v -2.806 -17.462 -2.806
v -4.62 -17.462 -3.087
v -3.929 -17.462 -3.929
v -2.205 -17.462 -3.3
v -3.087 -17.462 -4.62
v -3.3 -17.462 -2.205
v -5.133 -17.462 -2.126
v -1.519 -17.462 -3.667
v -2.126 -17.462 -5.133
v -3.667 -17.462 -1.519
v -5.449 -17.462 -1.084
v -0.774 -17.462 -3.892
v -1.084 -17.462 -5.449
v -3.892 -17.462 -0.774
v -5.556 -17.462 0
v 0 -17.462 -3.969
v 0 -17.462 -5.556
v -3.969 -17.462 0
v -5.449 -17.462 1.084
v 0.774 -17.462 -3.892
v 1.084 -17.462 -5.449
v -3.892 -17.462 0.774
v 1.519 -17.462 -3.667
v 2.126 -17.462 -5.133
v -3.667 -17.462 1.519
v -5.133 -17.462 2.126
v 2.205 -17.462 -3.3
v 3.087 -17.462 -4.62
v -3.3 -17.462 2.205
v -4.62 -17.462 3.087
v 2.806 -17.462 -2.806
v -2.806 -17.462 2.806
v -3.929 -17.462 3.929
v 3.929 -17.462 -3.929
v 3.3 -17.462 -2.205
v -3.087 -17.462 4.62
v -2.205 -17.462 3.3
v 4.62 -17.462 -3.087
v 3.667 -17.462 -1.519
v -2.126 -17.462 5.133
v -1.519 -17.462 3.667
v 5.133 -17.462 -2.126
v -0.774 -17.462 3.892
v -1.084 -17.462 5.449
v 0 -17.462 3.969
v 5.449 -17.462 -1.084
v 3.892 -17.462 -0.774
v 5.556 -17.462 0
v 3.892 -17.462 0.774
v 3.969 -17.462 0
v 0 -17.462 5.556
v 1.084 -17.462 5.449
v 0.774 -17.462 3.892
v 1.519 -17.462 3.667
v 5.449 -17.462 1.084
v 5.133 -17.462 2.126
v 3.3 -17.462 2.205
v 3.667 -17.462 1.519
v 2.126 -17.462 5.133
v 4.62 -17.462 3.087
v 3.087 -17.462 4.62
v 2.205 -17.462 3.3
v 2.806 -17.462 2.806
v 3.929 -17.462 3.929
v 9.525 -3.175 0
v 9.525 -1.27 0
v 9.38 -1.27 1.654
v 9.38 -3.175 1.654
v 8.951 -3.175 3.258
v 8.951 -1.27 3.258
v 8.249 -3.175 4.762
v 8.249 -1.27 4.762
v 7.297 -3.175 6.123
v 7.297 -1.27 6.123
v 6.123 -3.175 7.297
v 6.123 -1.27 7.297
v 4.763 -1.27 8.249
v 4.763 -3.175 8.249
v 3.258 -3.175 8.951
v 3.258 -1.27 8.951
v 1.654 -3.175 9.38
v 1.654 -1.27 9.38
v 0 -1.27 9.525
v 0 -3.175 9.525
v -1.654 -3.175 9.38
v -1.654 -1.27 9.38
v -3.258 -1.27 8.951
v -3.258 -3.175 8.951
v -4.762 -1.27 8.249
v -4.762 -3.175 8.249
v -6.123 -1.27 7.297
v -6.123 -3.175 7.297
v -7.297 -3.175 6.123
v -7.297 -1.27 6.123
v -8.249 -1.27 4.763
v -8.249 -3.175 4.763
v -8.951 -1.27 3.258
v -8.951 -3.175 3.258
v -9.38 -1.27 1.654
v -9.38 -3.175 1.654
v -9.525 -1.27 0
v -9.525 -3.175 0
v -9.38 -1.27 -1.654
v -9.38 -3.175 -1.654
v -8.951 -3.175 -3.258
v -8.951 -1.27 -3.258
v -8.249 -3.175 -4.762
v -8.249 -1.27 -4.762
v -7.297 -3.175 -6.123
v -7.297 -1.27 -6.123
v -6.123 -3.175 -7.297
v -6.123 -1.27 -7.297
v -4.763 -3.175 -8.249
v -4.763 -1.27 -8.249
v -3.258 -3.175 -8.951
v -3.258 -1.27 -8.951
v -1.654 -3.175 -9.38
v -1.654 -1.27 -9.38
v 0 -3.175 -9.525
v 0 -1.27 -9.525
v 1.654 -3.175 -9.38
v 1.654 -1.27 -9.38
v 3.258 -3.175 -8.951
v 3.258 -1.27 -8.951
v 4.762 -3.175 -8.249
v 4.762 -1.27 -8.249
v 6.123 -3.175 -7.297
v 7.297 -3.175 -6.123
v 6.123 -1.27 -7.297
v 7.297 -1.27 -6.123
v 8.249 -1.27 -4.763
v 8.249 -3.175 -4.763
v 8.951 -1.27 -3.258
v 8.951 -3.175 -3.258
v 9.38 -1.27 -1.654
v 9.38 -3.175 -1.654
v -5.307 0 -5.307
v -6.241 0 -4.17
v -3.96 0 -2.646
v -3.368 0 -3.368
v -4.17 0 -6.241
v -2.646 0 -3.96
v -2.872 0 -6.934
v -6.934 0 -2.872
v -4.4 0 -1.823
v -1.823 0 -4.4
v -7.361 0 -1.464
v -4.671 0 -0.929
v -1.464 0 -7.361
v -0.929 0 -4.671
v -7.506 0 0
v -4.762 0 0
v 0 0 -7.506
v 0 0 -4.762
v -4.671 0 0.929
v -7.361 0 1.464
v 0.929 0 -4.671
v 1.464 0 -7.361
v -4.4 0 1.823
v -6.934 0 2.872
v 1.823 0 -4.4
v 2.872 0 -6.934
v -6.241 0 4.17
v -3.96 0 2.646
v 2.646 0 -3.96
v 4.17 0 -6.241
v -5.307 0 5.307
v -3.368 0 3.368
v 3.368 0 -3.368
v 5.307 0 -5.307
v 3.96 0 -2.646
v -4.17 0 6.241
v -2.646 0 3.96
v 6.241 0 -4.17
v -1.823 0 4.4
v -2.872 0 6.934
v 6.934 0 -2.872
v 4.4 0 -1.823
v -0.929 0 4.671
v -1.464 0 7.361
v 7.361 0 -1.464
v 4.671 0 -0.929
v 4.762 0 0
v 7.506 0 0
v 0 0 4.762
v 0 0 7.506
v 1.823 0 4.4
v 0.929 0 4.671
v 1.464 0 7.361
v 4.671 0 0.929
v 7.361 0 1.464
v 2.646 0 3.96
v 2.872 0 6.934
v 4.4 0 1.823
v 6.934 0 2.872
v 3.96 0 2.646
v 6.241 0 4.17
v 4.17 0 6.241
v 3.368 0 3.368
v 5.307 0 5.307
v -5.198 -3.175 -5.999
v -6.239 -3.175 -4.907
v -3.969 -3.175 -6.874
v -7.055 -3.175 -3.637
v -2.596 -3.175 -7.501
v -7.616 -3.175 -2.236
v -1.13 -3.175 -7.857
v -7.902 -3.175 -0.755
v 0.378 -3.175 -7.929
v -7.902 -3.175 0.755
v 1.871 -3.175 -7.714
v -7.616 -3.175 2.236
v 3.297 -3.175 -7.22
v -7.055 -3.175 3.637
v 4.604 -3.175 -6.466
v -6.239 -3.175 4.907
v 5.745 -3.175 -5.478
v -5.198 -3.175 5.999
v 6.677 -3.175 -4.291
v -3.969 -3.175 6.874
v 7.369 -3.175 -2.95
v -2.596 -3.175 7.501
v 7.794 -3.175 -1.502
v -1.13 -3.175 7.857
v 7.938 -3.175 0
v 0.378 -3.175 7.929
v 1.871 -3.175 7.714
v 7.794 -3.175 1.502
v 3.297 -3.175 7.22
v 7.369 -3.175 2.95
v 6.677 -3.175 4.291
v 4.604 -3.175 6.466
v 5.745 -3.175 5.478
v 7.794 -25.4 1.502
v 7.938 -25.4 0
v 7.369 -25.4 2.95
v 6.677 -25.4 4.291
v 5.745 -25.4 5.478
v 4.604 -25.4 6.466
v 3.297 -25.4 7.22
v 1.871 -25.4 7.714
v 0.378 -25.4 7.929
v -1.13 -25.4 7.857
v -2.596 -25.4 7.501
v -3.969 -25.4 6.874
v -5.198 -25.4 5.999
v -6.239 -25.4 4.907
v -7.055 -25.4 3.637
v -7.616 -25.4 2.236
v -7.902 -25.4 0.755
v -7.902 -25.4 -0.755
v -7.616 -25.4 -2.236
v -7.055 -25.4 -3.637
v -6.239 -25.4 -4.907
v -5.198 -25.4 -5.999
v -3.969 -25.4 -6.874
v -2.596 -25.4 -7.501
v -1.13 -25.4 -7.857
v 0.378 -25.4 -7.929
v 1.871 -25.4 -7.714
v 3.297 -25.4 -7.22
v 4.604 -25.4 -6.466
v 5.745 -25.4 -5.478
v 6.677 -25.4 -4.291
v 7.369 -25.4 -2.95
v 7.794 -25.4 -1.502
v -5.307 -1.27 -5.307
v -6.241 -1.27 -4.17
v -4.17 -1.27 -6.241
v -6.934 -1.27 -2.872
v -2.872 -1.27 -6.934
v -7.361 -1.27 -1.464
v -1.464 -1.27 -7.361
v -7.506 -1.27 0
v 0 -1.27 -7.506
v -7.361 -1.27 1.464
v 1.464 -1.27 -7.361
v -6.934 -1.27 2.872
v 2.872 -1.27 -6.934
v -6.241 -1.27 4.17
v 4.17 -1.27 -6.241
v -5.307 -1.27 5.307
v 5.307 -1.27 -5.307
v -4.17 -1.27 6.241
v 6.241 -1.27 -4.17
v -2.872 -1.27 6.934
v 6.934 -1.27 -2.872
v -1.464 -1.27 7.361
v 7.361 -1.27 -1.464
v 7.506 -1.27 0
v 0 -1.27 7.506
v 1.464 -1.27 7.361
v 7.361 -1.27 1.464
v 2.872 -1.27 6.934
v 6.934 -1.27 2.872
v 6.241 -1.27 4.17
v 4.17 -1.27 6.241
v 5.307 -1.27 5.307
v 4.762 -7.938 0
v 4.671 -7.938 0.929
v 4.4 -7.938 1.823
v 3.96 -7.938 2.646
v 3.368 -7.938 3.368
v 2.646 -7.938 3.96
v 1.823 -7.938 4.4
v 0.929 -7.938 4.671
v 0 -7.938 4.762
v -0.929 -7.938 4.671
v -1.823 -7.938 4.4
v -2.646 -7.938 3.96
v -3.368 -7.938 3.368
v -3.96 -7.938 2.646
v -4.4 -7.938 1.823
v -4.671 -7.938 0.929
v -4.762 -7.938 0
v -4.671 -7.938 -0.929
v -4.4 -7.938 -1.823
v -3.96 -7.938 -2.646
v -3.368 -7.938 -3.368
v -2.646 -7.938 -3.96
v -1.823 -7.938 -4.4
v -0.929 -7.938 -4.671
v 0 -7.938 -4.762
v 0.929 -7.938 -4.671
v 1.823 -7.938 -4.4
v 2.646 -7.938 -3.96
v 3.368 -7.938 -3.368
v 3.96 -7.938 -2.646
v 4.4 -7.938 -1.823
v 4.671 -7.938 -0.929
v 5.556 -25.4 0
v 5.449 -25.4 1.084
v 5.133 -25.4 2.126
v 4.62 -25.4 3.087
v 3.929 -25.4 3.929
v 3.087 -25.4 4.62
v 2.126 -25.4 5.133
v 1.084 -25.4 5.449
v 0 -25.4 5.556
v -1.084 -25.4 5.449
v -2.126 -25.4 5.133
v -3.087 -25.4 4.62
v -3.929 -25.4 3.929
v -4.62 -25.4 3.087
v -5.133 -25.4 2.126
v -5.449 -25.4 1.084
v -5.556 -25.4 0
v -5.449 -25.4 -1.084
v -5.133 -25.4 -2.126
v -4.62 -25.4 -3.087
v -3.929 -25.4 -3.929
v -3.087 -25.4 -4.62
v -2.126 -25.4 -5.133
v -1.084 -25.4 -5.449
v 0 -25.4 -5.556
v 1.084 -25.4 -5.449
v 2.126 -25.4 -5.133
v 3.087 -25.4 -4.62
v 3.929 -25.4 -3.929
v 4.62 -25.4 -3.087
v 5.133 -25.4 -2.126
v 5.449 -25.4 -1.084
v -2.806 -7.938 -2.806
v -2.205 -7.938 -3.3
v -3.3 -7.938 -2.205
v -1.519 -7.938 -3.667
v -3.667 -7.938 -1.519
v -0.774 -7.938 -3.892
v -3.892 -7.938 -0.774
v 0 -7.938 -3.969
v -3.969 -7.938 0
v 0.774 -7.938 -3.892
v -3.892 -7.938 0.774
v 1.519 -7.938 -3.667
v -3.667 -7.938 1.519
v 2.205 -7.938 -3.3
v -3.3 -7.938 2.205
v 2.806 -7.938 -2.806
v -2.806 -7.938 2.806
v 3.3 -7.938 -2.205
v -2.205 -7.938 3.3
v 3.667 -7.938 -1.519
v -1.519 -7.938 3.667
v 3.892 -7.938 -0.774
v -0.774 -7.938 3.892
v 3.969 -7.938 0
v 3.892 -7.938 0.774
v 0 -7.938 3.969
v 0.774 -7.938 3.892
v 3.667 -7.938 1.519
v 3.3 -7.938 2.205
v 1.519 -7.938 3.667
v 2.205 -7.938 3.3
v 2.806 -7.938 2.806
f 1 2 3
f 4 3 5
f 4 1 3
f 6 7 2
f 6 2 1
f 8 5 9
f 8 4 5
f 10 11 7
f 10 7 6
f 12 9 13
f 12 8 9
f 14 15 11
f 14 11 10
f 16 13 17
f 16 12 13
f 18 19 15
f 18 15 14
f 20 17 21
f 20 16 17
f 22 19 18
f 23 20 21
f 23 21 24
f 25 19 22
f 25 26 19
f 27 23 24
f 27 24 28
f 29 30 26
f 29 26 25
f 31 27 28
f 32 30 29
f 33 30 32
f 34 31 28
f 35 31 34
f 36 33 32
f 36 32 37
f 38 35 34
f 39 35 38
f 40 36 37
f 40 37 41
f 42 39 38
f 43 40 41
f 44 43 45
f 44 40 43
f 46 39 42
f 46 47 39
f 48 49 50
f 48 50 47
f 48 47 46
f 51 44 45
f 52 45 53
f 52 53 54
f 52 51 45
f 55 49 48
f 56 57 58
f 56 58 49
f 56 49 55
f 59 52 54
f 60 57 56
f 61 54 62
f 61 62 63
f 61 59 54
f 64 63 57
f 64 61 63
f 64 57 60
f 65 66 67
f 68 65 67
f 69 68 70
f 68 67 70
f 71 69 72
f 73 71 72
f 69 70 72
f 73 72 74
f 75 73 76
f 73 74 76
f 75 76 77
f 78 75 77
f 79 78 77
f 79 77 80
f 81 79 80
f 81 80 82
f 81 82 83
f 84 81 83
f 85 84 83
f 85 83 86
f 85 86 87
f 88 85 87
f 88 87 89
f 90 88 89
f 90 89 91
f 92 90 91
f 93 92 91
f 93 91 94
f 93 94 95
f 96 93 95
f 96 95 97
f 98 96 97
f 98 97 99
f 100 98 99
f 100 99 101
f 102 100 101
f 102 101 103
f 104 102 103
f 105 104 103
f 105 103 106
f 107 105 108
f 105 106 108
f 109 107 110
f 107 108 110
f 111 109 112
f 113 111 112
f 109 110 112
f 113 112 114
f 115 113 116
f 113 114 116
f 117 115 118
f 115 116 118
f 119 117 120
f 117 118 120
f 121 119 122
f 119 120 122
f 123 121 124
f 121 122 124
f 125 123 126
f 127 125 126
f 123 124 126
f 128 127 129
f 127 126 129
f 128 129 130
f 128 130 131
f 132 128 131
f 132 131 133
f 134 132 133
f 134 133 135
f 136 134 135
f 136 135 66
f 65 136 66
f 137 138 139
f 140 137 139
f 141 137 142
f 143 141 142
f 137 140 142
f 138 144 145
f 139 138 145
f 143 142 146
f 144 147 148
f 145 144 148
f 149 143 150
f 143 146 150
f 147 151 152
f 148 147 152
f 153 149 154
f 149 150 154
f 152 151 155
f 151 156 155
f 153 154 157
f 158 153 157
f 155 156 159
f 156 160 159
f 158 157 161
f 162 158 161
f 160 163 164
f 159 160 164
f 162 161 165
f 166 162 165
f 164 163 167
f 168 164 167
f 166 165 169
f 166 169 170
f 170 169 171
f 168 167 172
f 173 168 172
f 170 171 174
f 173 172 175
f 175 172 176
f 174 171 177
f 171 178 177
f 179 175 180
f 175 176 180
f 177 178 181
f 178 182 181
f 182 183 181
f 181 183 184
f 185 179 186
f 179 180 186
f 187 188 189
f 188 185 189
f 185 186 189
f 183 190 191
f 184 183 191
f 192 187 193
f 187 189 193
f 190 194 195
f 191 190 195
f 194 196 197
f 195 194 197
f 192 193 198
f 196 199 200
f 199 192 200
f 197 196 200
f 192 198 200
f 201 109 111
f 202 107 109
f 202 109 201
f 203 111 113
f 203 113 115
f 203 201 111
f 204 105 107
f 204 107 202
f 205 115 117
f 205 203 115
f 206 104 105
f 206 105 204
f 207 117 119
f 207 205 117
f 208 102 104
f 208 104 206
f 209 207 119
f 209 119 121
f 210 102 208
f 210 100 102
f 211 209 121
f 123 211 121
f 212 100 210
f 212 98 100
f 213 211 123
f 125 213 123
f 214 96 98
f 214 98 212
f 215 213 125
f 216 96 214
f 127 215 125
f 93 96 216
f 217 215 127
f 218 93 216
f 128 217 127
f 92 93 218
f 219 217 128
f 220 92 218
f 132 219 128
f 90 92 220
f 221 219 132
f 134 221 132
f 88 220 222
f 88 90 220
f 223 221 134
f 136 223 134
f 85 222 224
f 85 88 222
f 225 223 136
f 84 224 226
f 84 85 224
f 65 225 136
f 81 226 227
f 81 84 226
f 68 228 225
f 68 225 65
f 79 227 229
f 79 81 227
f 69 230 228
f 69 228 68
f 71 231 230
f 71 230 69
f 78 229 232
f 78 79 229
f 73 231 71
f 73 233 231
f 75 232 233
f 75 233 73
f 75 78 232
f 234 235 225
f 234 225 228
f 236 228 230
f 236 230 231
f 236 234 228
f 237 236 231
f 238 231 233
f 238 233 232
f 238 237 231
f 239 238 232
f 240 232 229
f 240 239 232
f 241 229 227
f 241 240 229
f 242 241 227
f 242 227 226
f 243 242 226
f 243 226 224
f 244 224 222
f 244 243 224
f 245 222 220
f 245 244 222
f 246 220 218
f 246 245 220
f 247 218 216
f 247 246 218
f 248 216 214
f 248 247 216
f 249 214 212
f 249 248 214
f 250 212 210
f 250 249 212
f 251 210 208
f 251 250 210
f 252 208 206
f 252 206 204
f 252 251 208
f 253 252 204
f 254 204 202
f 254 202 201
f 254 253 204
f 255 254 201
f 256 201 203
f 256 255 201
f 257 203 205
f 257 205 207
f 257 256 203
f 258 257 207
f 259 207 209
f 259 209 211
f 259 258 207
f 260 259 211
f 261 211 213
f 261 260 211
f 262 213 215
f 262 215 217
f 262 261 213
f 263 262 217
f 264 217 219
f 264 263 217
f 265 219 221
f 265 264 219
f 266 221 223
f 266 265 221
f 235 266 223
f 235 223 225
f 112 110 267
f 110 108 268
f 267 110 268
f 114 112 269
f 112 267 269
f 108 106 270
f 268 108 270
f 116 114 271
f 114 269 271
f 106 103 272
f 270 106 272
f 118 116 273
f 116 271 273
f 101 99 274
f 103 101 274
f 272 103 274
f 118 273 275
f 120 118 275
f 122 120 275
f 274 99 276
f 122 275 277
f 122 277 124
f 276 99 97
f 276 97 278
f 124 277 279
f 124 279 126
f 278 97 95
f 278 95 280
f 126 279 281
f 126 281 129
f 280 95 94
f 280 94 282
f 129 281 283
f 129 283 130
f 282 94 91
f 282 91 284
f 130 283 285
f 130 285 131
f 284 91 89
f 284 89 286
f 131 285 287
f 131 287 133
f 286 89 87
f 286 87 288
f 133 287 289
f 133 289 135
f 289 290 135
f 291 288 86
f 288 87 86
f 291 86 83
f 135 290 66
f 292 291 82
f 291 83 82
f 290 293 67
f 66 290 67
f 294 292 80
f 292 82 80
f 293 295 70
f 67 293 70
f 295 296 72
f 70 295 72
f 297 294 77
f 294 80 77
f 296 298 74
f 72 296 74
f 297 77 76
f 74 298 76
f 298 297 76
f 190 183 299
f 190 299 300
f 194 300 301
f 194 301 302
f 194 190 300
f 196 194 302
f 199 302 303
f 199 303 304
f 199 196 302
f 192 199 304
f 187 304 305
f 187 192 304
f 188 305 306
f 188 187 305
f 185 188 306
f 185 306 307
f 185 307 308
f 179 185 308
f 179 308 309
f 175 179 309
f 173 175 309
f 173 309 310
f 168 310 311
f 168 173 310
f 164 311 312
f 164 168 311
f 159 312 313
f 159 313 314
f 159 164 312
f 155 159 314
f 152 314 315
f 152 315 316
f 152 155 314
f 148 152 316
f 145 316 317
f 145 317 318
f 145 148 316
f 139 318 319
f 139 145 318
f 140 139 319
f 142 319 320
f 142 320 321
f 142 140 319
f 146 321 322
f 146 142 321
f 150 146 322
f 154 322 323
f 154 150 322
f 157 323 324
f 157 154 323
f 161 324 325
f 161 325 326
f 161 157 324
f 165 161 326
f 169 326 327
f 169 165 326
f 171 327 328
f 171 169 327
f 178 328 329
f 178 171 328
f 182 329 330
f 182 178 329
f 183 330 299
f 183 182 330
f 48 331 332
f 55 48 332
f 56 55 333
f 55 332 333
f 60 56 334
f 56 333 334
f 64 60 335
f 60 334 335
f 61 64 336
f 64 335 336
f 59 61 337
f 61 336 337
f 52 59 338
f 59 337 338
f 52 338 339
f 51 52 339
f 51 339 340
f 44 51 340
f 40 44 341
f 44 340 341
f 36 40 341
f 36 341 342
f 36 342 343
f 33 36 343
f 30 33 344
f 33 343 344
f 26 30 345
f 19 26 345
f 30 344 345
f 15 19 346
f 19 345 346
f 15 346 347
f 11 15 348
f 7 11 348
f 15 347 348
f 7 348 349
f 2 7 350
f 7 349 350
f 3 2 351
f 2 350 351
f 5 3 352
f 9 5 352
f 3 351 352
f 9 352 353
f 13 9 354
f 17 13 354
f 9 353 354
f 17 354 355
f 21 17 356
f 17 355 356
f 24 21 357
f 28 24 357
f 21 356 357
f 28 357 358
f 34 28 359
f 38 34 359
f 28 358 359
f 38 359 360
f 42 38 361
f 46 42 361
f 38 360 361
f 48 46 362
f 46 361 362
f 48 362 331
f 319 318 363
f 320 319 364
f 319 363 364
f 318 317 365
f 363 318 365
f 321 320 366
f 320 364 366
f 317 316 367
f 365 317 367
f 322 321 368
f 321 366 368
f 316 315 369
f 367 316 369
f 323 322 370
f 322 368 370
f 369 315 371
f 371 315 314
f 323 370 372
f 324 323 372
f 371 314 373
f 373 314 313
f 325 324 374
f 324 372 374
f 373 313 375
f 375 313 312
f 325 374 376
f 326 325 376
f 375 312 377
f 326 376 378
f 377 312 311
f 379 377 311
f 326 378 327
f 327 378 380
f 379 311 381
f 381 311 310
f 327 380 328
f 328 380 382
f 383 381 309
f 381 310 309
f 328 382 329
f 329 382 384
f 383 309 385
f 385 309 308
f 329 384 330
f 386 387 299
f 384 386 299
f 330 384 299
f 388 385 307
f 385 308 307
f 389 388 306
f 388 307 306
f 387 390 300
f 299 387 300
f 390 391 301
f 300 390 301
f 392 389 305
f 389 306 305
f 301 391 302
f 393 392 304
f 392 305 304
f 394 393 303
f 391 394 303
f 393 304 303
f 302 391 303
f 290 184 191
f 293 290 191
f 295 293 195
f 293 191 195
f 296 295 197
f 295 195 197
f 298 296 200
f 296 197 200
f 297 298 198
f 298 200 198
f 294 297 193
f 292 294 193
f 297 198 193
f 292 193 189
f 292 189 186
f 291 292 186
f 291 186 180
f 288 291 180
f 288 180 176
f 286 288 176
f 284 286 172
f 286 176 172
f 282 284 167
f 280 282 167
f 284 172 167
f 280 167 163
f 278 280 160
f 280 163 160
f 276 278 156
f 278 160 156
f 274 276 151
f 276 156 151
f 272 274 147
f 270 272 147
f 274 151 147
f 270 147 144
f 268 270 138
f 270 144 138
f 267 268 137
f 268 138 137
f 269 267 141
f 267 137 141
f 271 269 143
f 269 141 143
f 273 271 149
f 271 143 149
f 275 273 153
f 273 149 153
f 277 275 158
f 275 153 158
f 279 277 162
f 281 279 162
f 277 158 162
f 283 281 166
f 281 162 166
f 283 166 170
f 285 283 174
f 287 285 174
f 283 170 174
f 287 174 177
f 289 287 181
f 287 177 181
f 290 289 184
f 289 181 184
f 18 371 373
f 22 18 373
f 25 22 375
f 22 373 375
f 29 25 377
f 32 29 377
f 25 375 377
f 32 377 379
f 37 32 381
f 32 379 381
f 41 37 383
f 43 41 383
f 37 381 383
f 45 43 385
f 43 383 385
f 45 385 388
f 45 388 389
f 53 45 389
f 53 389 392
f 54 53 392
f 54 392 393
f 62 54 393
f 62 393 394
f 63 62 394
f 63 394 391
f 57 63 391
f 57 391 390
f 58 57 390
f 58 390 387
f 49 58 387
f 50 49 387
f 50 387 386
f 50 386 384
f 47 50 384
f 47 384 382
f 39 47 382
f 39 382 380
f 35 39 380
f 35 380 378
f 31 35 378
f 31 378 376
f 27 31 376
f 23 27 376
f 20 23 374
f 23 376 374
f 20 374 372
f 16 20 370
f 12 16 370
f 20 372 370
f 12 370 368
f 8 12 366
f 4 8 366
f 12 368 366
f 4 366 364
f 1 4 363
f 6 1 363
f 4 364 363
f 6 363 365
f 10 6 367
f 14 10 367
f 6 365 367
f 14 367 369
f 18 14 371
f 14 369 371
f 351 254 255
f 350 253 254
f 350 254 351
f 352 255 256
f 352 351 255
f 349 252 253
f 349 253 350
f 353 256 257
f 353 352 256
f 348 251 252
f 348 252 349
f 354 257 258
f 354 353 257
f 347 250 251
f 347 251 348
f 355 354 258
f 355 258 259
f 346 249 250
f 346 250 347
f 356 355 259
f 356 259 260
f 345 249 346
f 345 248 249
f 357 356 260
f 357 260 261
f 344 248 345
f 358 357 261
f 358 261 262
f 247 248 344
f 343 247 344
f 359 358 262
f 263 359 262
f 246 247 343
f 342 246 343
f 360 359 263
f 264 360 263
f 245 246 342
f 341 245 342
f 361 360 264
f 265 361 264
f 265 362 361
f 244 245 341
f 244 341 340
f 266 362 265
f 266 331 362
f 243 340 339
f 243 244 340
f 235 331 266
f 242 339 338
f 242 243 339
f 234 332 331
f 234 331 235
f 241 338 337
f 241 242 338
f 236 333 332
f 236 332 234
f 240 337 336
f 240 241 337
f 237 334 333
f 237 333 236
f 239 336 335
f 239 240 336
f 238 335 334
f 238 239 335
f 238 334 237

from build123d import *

# Parameters (mm, degrees)
F0_R     = 9.525
F0_R_2   = 7.5057
F0_R_3   = 4.7625
F1_DEPTH = 25.4
F2_R     = 5.55625
F3_DEPTH = 7.9375
F2_R_2   = 9.525
F2_R_3   = 7.9375
F5_DEPTH = 22.225
F6_DEPTH = 1.27
F7_DEPTH = 7.9375
F8_D     = 7.9375


with BuildPart() as f1:
    # F0 (on Front) → F1 (new body)
    with BuildSketch(Plane.XZ):
        Circle(F0_R)
        Circle(F0_R_2, mode=Mode.SUBTRACT)
        Circle(F0_R_2)
        Circle(F0_R_3, mode=Mode.SUBTRACT)
        Circle(F0_R_3)
    extrude(amount=F1_DEPTH)

    # F2 (on face) → F3 (cut)
    with BuildSketch(Plane.XZ.offset(25.4)):
        Circle(F2_R)
    extrude(amount=-F3_DEPTH, mode=Mode.SUBTRACT)

    # F2 (on face) → F5 (cut)
    with BuildSketch(Plane.XZ.offset(25.4)):
        Circle(F2_R_2)
        Circle(F2_R_3, mode=Mode.SUBTRACT)
    extrude(amount=-F5_DEPTH, mode=Mode.SUBTRACT)

    # F0 (on Front) → F6 (cut)
    with BuildSketch(Plane.XZ):
        Circle(F0_R)
        Circle(F0_R_2, mode=Mode.SUBTRACT)
    extrude(amount=F6_DEPTH, mode=Mode.SUBTRACT)

    # F0 (on Front) → F7 (cut)
    with BuildSketch(Plane.XZ):
        Circle(F0_R_3)
    extrude(amount=F7_DEPTH, mode=Mode.SUBTRACT)

    # F8 (through all)
    with Locations(Plane.XZ.offset(17.4625)):
        with Locations((0, 0)):
            Hole(F8_D / 2)


solid = f1.part
